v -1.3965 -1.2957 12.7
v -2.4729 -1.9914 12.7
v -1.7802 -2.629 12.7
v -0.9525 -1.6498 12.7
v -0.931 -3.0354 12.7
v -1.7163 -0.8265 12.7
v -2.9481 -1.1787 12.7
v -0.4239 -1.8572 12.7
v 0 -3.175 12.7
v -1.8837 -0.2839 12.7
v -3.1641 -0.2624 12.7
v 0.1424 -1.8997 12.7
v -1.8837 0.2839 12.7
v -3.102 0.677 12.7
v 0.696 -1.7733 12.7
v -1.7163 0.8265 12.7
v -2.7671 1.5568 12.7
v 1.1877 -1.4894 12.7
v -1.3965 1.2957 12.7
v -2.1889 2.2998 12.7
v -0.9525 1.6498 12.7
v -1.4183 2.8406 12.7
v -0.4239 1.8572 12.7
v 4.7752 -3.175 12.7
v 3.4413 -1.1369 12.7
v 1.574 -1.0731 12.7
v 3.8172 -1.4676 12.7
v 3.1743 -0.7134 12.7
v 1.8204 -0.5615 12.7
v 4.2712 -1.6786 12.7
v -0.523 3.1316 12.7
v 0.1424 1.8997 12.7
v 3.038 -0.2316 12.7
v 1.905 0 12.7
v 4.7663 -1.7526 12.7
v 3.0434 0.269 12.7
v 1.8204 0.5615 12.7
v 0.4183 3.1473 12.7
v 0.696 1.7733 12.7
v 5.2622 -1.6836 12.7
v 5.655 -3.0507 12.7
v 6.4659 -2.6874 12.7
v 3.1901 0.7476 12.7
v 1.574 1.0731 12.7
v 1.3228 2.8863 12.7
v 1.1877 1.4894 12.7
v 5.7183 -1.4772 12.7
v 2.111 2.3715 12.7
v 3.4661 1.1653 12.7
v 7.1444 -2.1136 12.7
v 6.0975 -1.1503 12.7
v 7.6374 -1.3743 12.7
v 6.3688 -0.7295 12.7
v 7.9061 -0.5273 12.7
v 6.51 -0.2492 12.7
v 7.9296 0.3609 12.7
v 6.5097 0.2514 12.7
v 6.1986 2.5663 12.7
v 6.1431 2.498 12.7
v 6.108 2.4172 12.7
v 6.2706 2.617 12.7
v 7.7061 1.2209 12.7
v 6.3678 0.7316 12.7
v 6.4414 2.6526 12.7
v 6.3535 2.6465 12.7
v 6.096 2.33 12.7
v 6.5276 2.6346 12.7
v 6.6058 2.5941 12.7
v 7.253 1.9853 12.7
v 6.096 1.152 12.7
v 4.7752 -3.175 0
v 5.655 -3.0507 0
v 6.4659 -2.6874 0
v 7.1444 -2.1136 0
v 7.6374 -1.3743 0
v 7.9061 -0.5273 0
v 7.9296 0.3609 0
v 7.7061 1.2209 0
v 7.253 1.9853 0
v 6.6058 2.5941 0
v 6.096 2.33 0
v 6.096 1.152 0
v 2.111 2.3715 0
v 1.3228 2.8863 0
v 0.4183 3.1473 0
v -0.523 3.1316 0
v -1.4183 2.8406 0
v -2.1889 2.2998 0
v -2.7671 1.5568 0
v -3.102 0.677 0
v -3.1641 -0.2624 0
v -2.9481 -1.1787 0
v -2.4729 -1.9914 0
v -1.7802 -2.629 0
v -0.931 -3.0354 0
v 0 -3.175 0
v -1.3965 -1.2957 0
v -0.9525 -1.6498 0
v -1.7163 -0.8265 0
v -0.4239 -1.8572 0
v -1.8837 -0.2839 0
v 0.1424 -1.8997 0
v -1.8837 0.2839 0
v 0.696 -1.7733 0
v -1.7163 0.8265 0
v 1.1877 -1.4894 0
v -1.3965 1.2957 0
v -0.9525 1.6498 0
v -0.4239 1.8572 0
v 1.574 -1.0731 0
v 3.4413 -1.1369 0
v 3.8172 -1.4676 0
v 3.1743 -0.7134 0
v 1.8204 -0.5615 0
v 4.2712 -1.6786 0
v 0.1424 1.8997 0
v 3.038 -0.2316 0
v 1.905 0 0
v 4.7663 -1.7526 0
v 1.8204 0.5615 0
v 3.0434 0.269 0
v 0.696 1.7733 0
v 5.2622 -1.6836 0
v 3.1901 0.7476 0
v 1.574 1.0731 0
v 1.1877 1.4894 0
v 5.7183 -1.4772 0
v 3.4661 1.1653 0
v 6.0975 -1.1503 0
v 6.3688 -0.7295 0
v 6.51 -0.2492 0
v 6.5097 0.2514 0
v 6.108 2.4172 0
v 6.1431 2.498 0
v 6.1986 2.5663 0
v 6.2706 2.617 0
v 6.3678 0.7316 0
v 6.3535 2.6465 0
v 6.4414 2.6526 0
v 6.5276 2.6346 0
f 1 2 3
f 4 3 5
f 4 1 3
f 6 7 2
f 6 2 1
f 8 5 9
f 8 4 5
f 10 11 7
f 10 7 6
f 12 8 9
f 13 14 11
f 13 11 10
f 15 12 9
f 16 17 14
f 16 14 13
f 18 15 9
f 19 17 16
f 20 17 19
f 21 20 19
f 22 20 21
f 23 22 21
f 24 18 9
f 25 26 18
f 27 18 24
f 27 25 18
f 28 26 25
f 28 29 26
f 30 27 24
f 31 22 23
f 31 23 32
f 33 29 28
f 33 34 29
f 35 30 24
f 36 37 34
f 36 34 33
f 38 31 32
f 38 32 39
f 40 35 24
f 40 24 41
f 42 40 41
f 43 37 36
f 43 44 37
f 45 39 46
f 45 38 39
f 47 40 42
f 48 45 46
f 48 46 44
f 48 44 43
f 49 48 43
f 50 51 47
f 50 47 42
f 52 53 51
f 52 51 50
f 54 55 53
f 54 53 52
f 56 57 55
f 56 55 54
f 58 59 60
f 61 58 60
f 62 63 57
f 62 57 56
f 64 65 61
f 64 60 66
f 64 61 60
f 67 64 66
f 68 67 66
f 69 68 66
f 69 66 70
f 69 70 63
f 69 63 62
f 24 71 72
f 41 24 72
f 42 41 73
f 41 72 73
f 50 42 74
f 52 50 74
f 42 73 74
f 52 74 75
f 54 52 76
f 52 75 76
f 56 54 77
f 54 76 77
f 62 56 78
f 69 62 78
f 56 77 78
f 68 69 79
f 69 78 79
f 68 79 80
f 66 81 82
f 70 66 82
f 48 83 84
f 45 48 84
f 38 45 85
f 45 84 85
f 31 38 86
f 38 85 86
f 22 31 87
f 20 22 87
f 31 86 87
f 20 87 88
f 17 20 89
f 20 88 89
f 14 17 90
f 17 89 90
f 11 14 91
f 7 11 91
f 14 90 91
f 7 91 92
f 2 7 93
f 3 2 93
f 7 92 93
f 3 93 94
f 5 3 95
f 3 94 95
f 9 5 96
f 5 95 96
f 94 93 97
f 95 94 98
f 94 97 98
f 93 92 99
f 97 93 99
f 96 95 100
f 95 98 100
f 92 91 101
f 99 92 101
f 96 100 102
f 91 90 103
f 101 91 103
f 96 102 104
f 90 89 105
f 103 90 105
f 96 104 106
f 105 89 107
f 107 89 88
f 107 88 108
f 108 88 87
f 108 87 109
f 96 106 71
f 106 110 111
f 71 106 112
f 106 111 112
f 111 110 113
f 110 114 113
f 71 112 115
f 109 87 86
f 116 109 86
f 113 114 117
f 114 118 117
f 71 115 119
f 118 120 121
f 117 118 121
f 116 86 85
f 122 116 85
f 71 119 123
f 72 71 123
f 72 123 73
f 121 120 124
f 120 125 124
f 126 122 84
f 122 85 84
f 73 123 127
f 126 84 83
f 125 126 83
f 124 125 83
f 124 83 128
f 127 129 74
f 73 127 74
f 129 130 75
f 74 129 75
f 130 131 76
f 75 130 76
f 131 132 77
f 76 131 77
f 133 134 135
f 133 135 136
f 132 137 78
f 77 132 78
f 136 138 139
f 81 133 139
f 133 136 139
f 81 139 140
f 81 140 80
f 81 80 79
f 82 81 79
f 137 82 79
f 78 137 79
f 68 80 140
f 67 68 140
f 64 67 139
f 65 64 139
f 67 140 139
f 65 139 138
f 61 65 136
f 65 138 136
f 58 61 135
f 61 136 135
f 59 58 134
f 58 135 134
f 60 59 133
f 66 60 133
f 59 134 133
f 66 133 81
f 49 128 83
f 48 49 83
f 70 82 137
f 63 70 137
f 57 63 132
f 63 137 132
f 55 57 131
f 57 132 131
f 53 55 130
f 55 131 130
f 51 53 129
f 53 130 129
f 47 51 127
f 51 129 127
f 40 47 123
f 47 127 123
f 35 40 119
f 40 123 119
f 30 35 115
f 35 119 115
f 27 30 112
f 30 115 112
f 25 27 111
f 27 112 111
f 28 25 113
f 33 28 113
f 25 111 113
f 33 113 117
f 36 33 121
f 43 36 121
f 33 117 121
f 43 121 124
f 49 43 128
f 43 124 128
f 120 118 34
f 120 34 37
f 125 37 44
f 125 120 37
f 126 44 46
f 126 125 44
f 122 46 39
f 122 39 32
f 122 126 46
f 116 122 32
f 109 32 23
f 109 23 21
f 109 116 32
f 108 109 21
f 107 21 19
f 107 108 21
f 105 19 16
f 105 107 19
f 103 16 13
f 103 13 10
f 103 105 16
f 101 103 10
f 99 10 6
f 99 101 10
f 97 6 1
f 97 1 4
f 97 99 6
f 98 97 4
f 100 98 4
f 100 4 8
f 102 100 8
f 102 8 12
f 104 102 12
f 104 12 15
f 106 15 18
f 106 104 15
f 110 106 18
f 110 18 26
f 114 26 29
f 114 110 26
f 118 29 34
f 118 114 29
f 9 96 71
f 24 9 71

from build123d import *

# Parameters (mm, degrees)
F0_R     = 1.905
F1_DEPTH = 12.7


with BuildPart() as f1:
    # F0 (on Top) → F1 (new body)
    with BuildSketch(Plane.XY):
        with BuildLine():
            Line((3.466116, 1.165293), (2.111037, 2.371528))
            ThreePointArc((2.111037, 2.371528), (-2.967341, 1.129385), (0, -3.175))
            Line((0, -3.175), (4.7752, -3.175))
            ThreePointArc((4.7752, -3.175), (7.801505, -0.960261), (6.605779, 2.594148))
            ThreePointArc((6.605779, 2.594148), (6.270566, 2.61704), (6.096, 2.329955))
            Line((6.096, 2.329955), (6.096, 1.151996))
            ThreePointArc((6.096, 1.151996), (4.766339, -1.752578), (3.466116, 1.165293))
        make_face()
        Circle(F0_R, mode=Mode.SUBTRACT)
    extrude(amount=F1_DEPTH)


solid = f1.part
